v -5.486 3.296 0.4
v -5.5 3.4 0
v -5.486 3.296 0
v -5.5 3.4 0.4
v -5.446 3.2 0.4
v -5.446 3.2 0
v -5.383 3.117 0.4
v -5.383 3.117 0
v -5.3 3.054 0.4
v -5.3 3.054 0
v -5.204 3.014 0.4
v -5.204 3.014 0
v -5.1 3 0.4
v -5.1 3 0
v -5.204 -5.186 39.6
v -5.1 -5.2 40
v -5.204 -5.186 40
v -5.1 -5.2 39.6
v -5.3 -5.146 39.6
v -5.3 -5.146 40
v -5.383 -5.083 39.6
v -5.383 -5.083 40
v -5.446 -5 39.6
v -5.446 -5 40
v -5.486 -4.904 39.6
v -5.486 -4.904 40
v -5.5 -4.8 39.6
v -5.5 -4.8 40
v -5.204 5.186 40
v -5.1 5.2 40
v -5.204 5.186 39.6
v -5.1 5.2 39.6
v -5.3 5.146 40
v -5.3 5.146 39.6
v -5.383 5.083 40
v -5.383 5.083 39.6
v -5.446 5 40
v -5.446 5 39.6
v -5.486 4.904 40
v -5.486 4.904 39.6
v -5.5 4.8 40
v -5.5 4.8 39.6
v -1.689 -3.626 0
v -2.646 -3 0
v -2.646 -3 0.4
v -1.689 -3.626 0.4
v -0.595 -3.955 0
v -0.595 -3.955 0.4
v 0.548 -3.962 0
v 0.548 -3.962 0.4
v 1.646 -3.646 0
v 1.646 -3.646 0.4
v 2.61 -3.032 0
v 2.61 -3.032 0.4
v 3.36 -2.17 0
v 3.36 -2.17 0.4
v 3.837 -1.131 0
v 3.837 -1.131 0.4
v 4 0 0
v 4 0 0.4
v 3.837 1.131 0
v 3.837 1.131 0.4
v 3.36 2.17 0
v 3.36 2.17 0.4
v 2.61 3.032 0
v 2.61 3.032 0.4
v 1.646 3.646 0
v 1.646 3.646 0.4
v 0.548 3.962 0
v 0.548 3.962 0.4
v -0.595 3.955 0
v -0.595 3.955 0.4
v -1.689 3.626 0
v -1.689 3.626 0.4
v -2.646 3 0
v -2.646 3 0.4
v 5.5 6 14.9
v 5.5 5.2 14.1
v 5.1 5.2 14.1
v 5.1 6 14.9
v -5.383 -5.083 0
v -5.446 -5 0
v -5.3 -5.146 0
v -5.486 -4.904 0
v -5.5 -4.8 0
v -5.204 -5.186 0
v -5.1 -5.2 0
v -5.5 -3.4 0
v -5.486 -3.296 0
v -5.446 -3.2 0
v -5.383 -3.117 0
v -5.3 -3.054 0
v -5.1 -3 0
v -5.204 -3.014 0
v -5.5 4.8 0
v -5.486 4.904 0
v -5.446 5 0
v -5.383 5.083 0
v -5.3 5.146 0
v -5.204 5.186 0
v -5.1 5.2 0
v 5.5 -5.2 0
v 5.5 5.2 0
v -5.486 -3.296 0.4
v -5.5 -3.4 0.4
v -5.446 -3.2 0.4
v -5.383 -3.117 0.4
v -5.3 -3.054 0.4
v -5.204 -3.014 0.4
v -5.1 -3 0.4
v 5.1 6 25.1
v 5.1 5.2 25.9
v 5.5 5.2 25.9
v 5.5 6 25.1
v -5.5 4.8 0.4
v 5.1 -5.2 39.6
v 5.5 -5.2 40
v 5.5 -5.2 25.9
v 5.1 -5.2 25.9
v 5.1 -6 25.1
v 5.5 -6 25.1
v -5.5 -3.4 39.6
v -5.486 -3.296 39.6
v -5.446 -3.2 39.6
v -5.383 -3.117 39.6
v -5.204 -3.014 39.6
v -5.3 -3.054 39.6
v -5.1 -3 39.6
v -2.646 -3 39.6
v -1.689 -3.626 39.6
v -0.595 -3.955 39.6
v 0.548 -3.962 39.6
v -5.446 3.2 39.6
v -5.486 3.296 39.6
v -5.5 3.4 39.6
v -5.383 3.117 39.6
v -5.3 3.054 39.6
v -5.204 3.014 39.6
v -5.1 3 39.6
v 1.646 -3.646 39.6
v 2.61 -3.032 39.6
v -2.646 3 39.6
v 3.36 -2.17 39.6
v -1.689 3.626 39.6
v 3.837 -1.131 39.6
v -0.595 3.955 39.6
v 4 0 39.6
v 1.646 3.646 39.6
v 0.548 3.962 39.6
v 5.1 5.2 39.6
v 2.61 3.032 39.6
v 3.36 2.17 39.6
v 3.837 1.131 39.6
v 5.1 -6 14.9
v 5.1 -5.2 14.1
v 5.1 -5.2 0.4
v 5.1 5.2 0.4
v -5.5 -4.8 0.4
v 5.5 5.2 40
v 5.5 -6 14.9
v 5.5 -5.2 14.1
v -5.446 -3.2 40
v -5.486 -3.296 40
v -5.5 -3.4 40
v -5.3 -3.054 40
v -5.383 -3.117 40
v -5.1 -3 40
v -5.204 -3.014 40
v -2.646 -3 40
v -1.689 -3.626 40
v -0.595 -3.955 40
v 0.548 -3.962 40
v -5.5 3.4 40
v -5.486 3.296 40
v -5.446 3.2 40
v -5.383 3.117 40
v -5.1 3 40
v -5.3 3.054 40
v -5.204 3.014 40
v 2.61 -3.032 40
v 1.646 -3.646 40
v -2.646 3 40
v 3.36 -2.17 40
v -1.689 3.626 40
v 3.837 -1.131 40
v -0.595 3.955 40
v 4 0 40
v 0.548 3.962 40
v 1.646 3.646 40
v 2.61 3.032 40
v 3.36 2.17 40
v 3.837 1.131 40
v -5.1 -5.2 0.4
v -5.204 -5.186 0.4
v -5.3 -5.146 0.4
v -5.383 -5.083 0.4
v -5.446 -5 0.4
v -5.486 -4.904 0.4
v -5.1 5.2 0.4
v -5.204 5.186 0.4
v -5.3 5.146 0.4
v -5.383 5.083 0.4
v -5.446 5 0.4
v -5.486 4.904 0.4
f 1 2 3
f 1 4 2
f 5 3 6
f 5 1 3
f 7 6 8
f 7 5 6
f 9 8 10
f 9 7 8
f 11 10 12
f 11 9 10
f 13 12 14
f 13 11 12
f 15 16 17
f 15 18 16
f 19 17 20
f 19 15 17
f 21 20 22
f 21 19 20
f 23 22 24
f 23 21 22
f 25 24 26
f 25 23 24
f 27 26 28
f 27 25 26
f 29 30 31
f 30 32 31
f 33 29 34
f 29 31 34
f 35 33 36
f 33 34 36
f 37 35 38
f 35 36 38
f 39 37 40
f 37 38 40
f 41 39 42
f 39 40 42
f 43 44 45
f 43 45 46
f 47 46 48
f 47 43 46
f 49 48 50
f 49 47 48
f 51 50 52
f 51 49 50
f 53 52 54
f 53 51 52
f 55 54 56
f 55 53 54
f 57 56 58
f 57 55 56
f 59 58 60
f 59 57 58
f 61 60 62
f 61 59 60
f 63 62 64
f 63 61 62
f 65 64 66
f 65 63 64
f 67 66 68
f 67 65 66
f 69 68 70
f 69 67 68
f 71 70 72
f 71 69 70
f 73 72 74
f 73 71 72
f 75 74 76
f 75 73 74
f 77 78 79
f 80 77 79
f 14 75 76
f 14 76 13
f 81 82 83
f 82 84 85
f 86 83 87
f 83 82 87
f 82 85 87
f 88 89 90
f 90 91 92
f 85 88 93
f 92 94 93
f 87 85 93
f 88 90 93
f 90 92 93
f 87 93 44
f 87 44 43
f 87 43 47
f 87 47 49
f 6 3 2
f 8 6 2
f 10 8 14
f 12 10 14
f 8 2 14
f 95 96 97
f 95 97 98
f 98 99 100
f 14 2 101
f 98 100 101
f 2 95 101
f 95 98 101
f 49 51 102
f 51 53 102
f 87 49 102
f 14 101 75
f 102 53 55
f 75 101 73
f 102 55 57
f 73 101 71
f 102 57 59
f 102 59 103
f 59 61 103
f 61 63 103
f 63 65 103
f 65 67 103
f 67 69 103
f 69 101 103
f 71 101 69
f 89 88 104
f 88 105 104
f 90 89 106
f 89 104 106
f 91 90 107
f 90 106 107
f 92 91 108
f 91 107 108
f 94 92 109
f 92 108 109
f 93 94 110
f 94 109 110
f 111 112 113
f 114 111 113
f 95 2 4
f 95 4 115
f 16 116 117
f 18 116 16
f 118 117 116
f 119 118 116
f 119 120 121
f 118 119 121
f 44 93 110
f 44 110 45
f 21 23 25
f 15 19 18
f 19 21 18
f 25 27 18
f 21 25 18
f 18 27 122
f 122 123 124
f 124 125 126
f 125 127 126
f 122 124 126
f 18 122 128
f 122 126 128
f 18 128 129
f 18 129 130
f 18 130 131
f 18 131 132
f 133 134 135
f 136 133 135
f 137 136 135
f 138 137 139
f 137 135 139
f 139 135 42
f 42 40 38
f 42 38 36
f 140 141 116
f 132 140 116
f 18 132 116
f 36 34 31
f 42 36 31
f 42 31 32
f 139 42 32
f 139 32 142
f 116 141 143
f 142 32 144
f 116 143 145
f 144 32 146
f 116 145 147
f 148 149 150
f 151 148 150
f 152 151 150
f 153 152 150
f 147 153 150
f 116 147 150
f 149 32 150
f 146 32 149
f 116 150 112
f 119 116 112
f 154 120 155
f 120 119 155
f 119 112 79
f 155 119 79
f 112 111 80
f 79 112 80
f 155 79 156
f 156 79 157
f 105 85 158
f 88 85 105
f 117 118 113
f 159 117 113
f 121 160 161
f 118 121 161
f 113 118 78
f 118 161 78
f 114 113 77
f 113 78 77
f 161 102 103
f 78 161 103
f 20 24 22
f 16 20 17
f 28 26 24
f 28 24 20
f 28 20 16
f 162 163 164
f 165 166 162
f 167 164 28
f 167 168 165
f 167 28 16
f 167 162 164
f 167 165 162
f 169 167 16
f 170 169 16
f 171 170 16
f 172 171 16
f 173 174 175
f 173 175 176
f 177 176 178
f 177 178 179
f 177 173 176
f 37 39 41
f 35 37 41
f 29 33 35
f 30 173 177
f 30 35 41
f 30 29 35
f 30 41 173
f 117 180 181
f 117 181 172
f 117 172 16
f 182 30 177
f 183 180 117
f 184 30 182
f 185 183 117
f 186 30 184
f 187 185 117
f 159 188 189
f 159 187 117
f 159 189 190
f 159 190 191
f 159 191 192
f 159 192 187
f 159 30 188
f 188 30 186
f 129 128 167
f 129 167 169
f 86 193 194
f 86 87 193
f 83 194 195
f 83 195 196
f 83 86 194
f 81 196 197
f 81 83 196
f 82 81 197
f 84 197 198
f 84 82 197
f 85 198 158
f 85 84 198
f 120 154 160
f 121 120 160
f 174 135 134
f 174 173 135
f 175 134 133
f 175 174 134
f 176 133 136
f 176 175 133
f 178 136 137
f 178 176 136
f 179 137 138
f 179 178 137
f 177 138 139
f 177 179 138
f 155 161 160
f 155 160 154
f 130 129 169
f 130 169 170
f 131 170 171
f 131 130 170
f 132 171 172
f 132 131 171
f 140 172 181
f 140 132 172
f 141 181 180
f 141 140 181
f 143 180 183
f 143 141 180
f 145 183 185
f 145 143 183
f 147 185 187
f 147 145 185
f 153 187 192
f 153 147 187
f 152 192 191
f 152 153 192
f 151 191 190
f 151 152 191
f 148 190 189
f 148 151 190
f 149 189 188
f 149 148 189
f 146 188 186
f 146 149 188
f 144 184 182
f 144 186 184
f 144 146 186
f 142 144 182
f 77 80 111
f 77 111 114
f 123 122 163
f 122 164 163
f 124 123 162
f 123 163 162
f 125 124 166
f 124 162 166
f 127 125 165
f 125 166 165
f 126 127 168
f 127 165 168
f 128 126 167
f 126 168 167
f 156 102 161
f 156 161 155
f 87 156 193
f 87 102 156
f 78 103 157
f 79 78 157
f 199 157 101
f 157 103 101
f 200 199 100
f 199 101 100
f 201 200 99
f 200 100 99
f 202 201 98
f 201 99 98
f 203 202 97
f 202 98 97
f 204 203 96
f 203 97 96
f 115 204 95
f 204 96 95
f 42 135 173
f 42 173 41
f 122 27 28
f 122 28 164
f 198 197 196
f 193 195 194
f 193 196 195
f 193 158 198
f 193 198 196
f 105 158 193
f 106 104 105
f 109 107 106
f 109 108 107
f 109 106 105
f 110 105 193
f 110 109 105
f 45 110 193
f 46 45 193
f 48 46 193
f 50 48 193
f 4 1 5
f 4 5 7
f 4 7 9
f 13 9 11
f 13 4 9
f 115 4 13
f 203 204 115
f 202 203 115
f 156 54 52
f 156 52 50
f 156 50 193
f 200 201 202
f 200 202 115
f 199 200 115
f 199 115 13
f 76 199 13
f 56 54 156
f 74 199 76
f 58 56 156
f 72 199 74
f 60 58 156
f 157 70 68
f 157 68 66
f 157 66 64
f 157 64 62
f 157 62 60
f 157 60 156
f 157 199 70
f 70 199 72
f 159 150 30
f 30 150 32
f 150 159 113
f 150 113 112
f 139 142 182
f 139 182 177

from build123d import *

# Parameters (mm, degrees)
SKETCH1_W           = 11
SKETCH1_H           = 12
BOSS_EXTRUDE1_DEPTH = 40
SKETCH2_W           = 10.6
SKETCH2_H           = 39.2
CUT_EXTRUDE1_DEPTH  = 43.121847063
CUT_EXTRUDE2_DEPTH  = 0.8
CHAMFER1_SIZE       = 0.8
CUT_EXTRUDE3_DEPTH  = 41.819725624
FILLET1_R           = 0.4


with BuildPart() as part:
    # Sketch1 → Boss-Extrude1 (new body)
    with BuildSketch(Plane.XY):
        Rectangle(SKETCH1_W, SKETCH1_H)
    extrude(amount=BOSS_EXTRUDE1_DEPTH)

    # Sketch2 → Cut-Extrude1 (cut, through all)
    with BuildSketch(Plane(origin=(0, 6, 0), x_dir=(1, 0, 0), z_dir=(0, 1, 0))):
        with Locations((-0.2, -20)):
            Rectangle(SKETCH2_W, SKETCH2_H)
    extrude(amount=-CUT_EXTRUDE1_DEPTH, mode=Mode.SUBTRACT)

    # Sketch3 → Cut-Extrude2 (cut)
    with BuildSketch(Plane(origin=(0, 6, 0), x_dir=(1, 0, 0), z_dir=(0, 1, 0))):
        Polygon((-5.5, 0), (5.5, 0), (5.5, -14.1), (5.1, -14.1), (5.1, -25.9), (5.5, -25.9), (5.5, -40), (-5.5, -40), align=None)
    cut_extrude2 = extrude(amount=-CUT_EXTRUDE2_DEPTH, mode=Mode.SUBTRACT)

    # Mirror1: Cut-Extrude2 across plane
    add(cut_extrude2.mirror(Plane.ZX), mode=Mode.SUBTRACT)

    # Chamfer1
    chamfer1_edges = [part.edges().sort_by_distance(p)[0] for p in [
        (5.3, -6, 25.9),
        (5.3, -6, 14.1),
        (5.3, 6, 25.9),
        (5.3, 6, 14.1),
    ]]
    chamfer(chamfer1_edges, length=CHAMFER1_SIZE - 0.0001)  # a hair under: the kernel refuses the full size

    # Sketch4 → Cut-Extrude3 (cut, through all)
    with BuildSketch(Plane(origin=(0, 0, 0), x_dir=(-1, 0, 0), z_dir=(0, 0, -1))):
        with BuildLine():
            Line((5.5, -3), (2.645751311, -3))
            ThreePointArc((2.645751311, -3), (-4, 0), (2.645751311, 3))
            Line((2.645751311, 3), (5.5, 3))
            Line((5.5, 3), (5.5, -3))
        make_face()
    extrude(amount=-CUT_EXTRUDE3_DEPTH, mode=Mode.SUBTRACT)

    # Fillet1
    fillet1_edges = [part.edges().sort_by_distance(p)[0] for p in [
        (-5.5, 3, 0.2),
        (-5.5, 3, 39.8),
        (-5.5, -3, 0.2),
        (-5.5, -3, 39.8),
        (-5.5, 5.2, 0.2),
        (-5.5, 5.2, 39.8),
        (-5.5, -5.2, 39.8),
        (-5.5, -5.2, 0.2),
    ]]
    fillet(fillet1_edges, radius=FILLET1_R)


solid = part.part
